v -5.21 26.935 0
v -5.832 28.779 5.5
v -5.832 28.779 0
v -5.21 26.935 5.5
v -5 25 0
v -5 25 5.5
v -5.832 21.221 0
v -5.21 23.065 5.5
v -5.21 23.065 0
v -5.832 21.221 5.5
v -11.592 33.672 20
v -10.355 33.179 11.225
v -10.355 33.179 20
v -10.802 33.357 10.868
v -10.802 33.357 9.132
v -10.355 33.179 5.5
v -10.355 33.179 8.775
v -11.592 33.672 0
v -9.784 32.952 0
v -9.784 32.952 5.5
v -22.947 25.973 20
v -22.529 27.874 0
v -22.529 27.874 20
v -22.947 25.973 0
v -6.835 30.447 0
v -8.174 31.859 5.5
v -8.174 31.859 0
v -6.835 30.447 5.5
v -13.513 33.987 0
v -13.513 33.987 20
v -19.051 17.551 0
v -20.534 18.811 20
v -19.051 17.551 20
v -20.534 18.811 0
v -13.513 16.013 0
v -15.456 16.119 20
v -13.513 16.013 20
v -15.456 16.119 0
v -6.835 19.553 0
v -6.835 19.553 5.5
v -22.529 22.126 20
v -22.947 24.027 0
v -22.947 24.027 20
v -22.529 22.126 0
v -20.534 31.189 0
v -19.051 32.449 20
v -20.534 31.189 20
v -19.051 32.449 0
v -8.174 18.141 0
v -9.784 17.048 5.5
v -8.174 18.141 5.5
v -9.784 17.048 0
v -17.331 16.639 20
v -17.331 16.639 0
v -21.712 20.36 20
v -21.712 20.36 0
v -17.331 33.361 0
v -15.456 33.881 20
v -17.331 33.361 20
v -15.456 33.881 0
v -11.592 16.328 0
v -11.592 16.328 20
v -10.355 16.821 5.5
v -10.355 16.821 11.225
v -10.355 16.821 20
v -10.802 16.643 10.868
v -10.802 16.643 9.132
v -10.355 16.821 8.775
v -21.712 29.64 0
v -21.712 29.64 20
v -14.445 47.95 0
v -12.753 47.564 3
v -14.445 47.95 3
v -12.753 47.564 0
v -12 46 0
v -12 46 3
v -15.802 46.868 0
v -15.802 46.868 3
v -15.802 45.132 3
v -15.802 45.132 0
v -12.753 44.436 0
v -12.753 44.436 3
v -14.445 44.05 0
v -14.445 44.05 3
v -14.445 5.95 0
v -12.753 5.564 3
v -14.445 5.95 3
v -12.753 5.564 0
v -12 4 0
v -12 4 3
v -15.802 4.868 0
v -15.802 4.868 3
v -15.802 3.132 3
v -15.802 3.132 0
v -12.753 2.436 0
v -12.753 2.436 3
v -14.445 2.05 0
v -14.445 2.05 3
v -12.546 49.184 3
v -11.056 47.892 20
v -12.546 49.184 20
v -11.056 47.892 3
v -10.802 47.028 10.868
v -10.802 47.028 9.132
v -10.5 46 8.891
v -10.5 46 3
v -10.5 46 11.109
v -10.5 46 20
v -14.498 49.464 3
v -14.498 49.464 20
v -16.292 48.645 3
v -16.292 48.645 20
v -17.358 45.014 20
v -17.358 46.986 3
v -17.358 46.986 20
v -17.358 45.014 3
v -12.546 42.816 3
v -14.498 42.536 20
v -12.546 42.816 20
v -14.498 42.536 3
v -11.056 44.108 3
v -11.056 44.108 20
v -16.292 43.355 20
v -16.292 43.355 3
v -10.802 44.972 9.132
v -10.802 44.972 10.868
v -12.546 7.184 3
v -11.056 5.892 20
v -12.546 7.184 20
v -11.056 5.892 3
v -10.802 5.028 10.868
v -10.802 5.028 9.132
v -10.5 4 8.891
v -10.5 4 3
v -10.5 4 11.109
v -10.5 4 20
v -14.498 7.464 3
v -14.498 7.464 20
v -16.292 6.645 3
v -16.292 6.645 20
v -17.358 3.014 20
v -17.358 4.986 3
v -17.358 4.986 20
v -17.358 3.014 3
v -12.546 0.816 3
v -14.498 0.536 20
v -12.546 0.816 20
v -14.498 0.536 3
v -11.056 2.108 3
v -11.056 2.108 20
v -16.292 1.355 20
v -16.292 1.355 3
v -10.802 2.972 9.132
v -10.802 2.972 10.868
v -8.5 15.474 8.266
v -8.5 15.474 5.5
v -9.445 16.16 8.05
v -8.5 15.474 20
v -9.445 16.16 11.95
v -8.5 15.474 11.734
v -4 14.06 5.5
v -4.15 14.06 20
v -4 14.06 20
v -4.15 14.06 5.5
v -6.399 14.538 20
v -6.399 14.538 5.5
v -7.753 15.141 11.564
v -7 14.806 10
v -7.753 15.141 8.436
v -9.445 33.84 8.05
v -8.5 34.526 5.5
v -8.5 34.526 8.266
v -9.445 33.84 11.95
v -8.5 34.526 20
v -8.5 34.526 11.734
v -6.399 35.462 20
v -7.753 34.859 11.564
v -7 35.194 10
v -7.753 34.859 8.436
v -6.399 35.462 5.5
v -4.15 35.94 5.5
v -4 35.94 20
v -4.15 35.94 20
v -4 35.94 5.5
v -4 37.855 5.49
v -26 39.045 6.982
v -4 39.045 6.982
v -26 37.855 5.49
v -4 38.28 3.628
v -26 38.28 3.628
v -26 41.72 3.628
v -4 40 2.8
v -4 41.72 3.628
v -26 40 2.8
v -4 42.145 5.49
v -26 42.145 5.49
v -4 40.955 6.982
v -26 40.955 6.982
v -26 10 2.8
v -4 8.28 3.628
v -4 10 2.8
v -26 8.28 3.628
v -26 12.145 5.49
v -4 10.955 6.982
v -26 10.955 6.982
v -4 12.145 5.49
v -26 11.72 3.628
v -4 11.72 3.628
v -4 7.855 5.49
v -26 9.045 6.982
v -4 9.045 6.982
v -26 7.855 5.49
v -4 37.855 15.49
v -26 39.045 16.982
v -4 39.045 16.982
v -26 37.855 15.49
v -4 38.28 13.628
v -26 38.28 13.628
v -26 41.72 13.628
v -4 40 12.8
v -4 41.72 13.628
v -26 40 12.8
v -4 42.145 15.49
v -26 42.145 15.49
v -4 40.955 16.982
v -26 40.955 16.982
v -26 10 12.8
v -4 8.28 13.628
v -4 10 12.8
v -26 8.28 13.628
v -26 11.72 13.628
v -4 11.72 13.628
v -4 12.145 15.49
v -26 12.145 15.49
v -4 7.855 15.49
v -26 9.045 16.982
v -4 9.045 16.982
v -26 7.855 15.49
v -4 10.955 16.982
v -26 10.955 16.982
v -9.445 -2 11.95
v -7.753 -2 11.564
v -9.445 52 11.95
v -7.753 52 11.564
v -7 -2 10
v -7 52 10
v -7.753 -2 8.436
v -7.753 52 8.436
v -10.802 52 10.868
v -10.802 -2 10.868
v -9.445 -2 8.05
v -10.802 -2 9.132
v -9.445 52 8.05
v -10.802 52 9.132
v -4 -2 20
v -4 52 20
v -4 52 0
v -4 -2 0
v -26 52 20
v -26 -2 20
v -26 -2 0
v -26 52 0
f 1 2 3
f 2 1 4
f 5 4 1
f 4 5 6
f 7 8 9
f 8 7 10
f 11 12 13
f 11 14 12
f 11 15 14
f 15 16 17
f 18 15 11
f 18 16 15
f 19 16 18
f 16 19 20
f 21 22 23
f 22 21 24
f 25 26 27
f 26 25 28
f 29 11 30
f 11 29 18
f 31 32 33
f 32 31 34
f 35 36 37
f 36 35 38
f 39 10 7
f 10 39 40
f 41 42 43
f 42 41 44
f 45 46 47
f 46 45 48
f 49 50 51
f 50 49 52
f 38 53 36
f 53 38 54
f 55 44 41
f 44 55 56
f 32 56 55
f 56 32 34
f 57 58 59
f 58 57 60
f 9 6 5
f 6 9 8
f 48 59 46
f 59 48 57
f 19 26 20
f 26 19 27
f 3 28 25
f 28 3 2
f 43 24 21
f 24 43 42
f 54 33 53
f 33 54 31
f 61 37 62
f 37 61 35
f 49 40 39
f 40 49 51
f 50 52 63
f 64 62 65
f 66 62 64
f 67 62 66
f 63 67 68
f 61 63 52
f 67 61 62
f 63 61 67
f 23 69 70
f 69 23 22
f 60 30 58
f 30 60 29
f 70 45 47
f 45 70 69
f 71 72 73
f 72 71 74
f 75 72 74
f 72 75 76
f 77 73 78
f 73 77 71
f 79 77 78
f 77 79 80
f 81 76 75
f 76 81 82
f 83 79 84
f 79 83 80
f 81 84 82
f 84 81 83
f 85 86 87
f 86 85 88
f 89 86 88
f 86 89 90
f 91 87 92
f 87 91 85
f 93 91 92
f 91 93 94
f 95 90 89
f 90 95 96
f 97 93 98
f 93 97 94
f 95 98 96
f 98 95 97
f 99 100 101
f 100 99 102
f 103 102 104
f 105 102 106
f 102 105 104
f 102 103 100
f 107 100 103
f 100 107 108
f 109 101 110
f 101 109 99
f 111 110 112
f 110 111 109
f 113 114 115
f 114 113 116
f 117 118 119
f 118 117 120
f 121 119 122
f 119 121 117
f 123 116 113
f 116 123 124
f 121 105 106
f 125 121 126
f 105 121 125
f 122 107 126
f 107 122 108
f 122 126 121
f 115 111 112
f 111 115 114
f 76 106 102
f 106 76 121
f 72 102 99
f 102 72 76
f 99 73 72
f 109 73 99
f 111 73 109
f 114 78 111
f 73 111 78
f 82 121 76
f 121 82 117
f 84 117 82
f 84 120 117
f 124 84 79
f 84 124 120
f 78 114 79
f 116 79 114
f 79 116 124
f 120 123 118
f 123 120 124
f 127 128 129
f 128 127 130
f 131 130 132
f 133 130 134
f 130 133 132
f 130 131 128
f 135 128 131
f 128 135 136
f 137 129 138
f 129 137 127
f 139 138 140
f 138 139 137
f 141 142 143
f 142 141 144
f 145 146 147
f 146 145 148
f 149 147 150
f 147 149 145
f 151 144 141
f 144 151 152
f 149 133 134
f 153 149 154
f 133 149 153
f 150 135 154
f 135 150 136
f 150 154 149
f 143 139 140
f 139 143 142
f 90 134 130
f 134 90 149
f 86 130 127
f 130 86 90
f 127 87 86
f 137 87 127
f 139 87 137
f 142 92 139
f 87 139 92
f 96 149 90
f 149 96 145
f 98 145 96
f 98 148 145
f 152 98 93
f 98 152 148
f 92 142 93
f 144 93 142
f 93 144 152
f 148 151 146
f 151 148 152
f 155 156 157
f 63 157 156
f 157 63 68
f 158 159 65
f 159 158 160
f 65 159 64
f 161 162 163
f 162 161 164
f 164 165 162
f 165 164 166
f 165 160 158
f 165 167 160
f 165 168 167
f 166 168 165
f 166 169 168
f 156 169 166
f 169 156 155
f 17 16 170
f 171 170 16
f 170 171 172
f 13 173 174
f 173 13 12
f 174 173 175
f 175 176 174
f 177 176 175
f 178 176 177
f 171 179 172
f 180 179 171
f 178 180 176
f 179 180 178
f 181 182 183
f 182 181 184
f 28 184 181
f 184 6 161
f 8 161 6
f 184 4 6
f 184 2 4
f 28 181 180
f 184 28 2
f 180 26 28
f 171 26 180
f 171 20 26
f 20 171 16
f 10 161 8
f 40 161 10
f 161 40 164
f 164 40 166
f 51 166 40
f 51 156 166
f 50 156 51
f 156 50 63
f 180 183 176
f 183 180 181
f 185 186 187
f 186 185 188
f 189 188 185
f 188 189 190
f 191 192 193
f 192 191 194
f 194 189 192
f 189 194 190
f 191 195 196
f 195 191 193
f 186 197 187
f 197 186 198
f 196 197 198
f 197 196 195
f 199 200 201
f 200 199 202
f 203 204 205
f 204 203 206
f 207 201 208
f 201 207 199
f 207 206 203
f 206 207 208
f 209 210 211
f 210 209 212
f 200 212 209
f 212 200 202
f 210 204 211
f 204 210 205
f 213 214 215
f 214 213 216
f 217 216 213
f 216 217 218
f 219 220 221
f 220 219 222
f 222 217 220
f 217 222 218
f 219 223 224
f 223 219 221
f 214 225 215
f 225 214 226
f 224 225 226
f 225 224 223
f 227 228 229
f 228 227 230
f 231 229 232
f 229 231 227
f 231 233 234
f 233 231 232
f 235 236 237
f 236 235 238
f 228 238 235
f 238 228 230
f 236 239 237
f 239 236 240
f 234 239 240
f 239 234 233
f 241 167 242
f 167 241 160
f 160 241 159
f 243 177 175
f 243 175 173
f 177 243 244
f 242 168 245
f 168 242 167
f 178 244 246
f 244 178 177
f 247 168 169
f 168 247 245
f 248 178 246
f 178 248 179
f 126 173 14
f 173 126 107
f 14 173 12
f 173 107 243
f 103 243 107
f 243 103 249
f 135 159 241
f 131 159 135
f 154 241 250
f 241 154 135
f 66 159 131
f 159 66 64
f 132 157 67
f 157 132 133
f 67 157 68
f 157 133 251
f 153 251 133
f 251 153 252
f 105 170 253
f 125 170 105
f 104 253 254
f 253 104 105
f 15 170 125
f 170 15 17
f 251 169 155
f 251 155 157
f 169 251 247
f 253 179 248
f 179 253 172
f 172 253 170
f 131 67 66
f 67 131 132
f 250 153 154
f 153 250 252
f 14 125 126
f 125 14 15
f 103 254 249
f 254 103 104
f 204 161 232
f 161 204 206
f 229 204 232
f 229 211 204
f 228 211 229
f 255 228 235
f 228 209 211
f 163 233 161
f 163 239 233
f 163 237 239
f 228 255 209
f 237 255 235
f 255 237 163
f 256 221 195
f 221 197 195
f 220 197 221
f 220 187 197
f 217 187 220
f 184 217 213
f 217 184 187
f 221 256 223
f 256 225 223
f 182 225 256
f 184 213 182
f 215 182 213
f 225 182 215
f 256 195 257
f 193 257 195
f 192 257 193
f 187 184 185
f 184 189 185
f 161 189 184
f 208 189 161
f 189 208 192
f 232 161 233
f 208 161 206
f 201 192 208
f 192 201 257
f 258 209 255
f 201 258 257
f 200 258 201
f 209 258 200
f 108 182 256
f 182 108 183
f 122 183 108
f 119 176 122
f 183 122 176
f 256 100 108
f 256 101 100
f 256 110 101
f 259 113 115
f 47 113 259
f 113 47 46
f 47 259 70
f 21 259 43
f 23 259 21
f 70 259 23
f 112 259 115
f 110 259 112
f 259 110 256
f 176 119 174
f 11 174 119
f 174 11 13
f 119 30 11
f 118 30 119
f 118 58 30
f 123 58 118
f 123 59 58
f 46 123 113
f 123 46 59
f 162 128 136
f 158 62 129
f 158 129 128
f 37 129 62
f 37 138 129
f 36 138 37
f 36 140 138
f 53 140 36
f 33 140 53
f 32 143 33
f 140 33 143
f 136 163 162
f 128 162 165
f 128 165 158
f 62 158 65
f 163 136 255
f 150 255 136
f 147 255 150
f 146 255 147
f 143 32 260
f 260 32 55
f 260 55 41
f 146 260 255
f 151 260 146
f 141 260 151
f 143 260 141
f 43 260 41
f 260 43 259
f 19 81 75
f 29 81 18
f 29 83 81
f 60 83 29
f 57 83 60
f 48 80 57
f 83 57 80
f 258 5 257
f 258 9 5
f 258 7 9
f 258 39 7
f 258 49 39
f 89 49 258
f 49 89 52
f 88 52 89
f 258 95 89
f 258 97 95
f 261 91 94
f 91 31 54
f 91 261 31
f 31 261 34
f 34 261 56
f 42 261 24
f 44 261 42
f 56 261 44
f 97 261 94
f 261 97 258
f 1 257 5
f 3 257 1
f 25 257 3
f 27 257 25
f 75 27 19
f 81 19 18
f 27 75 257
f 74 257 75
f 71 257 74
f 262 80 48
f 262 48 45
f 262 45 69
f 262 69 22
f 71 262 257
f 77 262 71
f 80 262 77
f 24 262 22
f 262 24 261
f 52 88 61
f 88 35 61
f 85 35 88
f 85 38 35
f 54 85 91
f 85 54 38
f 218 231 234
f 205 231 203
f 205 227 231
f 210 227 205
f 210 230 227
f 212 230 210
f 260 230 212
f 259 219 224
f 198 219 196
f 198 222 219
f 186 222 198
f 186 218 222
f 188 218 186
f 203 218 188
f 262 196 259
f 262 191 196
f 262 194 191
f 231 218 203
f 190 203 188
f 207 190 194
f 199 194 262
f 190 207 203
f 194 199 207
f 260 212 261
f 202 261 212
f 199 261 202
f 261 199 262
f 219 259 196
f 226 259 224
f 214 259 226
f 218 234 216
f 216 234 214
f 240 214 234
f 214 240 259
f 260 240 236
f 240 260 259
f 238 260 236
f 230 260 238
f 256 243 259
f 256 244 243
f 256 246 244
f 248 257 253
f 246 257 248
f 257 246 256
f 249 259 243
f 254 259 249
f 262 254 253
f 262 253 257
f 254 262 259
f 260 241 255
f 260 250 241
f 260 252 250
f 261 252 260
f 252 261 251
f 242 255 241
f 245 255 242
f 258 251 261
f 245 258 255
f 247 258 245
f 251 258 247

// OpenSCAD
module base(){
translate([-1,-2,0]) cube([22,54,20]);

}

module holes(){
//translate to center of the main block
 translate([11,25,0]){
  translate([0,0,-1]) cylinder(r=9, h=22);
  translate([0,21,-1]) cylinder(r=2, h=22);
  translate([0,-21,-1]) cylinder(r=2, h=22);
  translate([0,21,3]) cylinder(r=3.5, h=22);
  translate([0,-21,3]) cylinder(r=3.5, h=22);
  //cutout for bearing

  translate([11,0,-4.5+10]) cylinder(r=11, h=20);
 }
//filament hole 
 translate([1.5+11+3.5,65,10]) rotate([90,0,0])cylinder(r=2, h=70);
	//idler holse
	translate([11,25,10]){
	translate([-30,15,-5]) rotate([0,90,0]) cylinder(r=2.2, h=70);
	translate([-30,-15,-5]) rotate([0,90,0]) cylinder(r=2.2, h=70);
	translate([-30,15,5]) rotate([0,90,0]) cylinder(r=2.2, h=70);
	translate([-30,-15,5]) rotate([0,90,0]) cylinder(r=2.2, h=70);
	}
}

translate([-25,0,0])difference(){
base();
holes();
}


//translate([-25,0,0]) difference(){
//base();
//holes();
//}
   //translate([1.5+11+3.5,65,10]) rotate([90,0,0])cylinder(r=1.5, h=70);


module idler_base(){
translate([0.25,5,0]) cube([19.5,40,8+3]);
}

module idler_holes(){
translate([10,25,0]){
cube([10,23,25], center= true);
translate([-12,0,4.1+2])rotate([0,90,0])cylinder(r=4.1, h=24);


translate([5,15,-1])cylinder(r=2.2, h=24);
translate([5,-15,-1])cylinder(r=2.2, h=24);
translate([-5,15,-1])cylinder(r=2.2, h=24);
translate([-5,-15,-1])cylinder(r=2.2, h=24);
}
}

//difference(){
//idler_base();
//idler_holes();
//}
